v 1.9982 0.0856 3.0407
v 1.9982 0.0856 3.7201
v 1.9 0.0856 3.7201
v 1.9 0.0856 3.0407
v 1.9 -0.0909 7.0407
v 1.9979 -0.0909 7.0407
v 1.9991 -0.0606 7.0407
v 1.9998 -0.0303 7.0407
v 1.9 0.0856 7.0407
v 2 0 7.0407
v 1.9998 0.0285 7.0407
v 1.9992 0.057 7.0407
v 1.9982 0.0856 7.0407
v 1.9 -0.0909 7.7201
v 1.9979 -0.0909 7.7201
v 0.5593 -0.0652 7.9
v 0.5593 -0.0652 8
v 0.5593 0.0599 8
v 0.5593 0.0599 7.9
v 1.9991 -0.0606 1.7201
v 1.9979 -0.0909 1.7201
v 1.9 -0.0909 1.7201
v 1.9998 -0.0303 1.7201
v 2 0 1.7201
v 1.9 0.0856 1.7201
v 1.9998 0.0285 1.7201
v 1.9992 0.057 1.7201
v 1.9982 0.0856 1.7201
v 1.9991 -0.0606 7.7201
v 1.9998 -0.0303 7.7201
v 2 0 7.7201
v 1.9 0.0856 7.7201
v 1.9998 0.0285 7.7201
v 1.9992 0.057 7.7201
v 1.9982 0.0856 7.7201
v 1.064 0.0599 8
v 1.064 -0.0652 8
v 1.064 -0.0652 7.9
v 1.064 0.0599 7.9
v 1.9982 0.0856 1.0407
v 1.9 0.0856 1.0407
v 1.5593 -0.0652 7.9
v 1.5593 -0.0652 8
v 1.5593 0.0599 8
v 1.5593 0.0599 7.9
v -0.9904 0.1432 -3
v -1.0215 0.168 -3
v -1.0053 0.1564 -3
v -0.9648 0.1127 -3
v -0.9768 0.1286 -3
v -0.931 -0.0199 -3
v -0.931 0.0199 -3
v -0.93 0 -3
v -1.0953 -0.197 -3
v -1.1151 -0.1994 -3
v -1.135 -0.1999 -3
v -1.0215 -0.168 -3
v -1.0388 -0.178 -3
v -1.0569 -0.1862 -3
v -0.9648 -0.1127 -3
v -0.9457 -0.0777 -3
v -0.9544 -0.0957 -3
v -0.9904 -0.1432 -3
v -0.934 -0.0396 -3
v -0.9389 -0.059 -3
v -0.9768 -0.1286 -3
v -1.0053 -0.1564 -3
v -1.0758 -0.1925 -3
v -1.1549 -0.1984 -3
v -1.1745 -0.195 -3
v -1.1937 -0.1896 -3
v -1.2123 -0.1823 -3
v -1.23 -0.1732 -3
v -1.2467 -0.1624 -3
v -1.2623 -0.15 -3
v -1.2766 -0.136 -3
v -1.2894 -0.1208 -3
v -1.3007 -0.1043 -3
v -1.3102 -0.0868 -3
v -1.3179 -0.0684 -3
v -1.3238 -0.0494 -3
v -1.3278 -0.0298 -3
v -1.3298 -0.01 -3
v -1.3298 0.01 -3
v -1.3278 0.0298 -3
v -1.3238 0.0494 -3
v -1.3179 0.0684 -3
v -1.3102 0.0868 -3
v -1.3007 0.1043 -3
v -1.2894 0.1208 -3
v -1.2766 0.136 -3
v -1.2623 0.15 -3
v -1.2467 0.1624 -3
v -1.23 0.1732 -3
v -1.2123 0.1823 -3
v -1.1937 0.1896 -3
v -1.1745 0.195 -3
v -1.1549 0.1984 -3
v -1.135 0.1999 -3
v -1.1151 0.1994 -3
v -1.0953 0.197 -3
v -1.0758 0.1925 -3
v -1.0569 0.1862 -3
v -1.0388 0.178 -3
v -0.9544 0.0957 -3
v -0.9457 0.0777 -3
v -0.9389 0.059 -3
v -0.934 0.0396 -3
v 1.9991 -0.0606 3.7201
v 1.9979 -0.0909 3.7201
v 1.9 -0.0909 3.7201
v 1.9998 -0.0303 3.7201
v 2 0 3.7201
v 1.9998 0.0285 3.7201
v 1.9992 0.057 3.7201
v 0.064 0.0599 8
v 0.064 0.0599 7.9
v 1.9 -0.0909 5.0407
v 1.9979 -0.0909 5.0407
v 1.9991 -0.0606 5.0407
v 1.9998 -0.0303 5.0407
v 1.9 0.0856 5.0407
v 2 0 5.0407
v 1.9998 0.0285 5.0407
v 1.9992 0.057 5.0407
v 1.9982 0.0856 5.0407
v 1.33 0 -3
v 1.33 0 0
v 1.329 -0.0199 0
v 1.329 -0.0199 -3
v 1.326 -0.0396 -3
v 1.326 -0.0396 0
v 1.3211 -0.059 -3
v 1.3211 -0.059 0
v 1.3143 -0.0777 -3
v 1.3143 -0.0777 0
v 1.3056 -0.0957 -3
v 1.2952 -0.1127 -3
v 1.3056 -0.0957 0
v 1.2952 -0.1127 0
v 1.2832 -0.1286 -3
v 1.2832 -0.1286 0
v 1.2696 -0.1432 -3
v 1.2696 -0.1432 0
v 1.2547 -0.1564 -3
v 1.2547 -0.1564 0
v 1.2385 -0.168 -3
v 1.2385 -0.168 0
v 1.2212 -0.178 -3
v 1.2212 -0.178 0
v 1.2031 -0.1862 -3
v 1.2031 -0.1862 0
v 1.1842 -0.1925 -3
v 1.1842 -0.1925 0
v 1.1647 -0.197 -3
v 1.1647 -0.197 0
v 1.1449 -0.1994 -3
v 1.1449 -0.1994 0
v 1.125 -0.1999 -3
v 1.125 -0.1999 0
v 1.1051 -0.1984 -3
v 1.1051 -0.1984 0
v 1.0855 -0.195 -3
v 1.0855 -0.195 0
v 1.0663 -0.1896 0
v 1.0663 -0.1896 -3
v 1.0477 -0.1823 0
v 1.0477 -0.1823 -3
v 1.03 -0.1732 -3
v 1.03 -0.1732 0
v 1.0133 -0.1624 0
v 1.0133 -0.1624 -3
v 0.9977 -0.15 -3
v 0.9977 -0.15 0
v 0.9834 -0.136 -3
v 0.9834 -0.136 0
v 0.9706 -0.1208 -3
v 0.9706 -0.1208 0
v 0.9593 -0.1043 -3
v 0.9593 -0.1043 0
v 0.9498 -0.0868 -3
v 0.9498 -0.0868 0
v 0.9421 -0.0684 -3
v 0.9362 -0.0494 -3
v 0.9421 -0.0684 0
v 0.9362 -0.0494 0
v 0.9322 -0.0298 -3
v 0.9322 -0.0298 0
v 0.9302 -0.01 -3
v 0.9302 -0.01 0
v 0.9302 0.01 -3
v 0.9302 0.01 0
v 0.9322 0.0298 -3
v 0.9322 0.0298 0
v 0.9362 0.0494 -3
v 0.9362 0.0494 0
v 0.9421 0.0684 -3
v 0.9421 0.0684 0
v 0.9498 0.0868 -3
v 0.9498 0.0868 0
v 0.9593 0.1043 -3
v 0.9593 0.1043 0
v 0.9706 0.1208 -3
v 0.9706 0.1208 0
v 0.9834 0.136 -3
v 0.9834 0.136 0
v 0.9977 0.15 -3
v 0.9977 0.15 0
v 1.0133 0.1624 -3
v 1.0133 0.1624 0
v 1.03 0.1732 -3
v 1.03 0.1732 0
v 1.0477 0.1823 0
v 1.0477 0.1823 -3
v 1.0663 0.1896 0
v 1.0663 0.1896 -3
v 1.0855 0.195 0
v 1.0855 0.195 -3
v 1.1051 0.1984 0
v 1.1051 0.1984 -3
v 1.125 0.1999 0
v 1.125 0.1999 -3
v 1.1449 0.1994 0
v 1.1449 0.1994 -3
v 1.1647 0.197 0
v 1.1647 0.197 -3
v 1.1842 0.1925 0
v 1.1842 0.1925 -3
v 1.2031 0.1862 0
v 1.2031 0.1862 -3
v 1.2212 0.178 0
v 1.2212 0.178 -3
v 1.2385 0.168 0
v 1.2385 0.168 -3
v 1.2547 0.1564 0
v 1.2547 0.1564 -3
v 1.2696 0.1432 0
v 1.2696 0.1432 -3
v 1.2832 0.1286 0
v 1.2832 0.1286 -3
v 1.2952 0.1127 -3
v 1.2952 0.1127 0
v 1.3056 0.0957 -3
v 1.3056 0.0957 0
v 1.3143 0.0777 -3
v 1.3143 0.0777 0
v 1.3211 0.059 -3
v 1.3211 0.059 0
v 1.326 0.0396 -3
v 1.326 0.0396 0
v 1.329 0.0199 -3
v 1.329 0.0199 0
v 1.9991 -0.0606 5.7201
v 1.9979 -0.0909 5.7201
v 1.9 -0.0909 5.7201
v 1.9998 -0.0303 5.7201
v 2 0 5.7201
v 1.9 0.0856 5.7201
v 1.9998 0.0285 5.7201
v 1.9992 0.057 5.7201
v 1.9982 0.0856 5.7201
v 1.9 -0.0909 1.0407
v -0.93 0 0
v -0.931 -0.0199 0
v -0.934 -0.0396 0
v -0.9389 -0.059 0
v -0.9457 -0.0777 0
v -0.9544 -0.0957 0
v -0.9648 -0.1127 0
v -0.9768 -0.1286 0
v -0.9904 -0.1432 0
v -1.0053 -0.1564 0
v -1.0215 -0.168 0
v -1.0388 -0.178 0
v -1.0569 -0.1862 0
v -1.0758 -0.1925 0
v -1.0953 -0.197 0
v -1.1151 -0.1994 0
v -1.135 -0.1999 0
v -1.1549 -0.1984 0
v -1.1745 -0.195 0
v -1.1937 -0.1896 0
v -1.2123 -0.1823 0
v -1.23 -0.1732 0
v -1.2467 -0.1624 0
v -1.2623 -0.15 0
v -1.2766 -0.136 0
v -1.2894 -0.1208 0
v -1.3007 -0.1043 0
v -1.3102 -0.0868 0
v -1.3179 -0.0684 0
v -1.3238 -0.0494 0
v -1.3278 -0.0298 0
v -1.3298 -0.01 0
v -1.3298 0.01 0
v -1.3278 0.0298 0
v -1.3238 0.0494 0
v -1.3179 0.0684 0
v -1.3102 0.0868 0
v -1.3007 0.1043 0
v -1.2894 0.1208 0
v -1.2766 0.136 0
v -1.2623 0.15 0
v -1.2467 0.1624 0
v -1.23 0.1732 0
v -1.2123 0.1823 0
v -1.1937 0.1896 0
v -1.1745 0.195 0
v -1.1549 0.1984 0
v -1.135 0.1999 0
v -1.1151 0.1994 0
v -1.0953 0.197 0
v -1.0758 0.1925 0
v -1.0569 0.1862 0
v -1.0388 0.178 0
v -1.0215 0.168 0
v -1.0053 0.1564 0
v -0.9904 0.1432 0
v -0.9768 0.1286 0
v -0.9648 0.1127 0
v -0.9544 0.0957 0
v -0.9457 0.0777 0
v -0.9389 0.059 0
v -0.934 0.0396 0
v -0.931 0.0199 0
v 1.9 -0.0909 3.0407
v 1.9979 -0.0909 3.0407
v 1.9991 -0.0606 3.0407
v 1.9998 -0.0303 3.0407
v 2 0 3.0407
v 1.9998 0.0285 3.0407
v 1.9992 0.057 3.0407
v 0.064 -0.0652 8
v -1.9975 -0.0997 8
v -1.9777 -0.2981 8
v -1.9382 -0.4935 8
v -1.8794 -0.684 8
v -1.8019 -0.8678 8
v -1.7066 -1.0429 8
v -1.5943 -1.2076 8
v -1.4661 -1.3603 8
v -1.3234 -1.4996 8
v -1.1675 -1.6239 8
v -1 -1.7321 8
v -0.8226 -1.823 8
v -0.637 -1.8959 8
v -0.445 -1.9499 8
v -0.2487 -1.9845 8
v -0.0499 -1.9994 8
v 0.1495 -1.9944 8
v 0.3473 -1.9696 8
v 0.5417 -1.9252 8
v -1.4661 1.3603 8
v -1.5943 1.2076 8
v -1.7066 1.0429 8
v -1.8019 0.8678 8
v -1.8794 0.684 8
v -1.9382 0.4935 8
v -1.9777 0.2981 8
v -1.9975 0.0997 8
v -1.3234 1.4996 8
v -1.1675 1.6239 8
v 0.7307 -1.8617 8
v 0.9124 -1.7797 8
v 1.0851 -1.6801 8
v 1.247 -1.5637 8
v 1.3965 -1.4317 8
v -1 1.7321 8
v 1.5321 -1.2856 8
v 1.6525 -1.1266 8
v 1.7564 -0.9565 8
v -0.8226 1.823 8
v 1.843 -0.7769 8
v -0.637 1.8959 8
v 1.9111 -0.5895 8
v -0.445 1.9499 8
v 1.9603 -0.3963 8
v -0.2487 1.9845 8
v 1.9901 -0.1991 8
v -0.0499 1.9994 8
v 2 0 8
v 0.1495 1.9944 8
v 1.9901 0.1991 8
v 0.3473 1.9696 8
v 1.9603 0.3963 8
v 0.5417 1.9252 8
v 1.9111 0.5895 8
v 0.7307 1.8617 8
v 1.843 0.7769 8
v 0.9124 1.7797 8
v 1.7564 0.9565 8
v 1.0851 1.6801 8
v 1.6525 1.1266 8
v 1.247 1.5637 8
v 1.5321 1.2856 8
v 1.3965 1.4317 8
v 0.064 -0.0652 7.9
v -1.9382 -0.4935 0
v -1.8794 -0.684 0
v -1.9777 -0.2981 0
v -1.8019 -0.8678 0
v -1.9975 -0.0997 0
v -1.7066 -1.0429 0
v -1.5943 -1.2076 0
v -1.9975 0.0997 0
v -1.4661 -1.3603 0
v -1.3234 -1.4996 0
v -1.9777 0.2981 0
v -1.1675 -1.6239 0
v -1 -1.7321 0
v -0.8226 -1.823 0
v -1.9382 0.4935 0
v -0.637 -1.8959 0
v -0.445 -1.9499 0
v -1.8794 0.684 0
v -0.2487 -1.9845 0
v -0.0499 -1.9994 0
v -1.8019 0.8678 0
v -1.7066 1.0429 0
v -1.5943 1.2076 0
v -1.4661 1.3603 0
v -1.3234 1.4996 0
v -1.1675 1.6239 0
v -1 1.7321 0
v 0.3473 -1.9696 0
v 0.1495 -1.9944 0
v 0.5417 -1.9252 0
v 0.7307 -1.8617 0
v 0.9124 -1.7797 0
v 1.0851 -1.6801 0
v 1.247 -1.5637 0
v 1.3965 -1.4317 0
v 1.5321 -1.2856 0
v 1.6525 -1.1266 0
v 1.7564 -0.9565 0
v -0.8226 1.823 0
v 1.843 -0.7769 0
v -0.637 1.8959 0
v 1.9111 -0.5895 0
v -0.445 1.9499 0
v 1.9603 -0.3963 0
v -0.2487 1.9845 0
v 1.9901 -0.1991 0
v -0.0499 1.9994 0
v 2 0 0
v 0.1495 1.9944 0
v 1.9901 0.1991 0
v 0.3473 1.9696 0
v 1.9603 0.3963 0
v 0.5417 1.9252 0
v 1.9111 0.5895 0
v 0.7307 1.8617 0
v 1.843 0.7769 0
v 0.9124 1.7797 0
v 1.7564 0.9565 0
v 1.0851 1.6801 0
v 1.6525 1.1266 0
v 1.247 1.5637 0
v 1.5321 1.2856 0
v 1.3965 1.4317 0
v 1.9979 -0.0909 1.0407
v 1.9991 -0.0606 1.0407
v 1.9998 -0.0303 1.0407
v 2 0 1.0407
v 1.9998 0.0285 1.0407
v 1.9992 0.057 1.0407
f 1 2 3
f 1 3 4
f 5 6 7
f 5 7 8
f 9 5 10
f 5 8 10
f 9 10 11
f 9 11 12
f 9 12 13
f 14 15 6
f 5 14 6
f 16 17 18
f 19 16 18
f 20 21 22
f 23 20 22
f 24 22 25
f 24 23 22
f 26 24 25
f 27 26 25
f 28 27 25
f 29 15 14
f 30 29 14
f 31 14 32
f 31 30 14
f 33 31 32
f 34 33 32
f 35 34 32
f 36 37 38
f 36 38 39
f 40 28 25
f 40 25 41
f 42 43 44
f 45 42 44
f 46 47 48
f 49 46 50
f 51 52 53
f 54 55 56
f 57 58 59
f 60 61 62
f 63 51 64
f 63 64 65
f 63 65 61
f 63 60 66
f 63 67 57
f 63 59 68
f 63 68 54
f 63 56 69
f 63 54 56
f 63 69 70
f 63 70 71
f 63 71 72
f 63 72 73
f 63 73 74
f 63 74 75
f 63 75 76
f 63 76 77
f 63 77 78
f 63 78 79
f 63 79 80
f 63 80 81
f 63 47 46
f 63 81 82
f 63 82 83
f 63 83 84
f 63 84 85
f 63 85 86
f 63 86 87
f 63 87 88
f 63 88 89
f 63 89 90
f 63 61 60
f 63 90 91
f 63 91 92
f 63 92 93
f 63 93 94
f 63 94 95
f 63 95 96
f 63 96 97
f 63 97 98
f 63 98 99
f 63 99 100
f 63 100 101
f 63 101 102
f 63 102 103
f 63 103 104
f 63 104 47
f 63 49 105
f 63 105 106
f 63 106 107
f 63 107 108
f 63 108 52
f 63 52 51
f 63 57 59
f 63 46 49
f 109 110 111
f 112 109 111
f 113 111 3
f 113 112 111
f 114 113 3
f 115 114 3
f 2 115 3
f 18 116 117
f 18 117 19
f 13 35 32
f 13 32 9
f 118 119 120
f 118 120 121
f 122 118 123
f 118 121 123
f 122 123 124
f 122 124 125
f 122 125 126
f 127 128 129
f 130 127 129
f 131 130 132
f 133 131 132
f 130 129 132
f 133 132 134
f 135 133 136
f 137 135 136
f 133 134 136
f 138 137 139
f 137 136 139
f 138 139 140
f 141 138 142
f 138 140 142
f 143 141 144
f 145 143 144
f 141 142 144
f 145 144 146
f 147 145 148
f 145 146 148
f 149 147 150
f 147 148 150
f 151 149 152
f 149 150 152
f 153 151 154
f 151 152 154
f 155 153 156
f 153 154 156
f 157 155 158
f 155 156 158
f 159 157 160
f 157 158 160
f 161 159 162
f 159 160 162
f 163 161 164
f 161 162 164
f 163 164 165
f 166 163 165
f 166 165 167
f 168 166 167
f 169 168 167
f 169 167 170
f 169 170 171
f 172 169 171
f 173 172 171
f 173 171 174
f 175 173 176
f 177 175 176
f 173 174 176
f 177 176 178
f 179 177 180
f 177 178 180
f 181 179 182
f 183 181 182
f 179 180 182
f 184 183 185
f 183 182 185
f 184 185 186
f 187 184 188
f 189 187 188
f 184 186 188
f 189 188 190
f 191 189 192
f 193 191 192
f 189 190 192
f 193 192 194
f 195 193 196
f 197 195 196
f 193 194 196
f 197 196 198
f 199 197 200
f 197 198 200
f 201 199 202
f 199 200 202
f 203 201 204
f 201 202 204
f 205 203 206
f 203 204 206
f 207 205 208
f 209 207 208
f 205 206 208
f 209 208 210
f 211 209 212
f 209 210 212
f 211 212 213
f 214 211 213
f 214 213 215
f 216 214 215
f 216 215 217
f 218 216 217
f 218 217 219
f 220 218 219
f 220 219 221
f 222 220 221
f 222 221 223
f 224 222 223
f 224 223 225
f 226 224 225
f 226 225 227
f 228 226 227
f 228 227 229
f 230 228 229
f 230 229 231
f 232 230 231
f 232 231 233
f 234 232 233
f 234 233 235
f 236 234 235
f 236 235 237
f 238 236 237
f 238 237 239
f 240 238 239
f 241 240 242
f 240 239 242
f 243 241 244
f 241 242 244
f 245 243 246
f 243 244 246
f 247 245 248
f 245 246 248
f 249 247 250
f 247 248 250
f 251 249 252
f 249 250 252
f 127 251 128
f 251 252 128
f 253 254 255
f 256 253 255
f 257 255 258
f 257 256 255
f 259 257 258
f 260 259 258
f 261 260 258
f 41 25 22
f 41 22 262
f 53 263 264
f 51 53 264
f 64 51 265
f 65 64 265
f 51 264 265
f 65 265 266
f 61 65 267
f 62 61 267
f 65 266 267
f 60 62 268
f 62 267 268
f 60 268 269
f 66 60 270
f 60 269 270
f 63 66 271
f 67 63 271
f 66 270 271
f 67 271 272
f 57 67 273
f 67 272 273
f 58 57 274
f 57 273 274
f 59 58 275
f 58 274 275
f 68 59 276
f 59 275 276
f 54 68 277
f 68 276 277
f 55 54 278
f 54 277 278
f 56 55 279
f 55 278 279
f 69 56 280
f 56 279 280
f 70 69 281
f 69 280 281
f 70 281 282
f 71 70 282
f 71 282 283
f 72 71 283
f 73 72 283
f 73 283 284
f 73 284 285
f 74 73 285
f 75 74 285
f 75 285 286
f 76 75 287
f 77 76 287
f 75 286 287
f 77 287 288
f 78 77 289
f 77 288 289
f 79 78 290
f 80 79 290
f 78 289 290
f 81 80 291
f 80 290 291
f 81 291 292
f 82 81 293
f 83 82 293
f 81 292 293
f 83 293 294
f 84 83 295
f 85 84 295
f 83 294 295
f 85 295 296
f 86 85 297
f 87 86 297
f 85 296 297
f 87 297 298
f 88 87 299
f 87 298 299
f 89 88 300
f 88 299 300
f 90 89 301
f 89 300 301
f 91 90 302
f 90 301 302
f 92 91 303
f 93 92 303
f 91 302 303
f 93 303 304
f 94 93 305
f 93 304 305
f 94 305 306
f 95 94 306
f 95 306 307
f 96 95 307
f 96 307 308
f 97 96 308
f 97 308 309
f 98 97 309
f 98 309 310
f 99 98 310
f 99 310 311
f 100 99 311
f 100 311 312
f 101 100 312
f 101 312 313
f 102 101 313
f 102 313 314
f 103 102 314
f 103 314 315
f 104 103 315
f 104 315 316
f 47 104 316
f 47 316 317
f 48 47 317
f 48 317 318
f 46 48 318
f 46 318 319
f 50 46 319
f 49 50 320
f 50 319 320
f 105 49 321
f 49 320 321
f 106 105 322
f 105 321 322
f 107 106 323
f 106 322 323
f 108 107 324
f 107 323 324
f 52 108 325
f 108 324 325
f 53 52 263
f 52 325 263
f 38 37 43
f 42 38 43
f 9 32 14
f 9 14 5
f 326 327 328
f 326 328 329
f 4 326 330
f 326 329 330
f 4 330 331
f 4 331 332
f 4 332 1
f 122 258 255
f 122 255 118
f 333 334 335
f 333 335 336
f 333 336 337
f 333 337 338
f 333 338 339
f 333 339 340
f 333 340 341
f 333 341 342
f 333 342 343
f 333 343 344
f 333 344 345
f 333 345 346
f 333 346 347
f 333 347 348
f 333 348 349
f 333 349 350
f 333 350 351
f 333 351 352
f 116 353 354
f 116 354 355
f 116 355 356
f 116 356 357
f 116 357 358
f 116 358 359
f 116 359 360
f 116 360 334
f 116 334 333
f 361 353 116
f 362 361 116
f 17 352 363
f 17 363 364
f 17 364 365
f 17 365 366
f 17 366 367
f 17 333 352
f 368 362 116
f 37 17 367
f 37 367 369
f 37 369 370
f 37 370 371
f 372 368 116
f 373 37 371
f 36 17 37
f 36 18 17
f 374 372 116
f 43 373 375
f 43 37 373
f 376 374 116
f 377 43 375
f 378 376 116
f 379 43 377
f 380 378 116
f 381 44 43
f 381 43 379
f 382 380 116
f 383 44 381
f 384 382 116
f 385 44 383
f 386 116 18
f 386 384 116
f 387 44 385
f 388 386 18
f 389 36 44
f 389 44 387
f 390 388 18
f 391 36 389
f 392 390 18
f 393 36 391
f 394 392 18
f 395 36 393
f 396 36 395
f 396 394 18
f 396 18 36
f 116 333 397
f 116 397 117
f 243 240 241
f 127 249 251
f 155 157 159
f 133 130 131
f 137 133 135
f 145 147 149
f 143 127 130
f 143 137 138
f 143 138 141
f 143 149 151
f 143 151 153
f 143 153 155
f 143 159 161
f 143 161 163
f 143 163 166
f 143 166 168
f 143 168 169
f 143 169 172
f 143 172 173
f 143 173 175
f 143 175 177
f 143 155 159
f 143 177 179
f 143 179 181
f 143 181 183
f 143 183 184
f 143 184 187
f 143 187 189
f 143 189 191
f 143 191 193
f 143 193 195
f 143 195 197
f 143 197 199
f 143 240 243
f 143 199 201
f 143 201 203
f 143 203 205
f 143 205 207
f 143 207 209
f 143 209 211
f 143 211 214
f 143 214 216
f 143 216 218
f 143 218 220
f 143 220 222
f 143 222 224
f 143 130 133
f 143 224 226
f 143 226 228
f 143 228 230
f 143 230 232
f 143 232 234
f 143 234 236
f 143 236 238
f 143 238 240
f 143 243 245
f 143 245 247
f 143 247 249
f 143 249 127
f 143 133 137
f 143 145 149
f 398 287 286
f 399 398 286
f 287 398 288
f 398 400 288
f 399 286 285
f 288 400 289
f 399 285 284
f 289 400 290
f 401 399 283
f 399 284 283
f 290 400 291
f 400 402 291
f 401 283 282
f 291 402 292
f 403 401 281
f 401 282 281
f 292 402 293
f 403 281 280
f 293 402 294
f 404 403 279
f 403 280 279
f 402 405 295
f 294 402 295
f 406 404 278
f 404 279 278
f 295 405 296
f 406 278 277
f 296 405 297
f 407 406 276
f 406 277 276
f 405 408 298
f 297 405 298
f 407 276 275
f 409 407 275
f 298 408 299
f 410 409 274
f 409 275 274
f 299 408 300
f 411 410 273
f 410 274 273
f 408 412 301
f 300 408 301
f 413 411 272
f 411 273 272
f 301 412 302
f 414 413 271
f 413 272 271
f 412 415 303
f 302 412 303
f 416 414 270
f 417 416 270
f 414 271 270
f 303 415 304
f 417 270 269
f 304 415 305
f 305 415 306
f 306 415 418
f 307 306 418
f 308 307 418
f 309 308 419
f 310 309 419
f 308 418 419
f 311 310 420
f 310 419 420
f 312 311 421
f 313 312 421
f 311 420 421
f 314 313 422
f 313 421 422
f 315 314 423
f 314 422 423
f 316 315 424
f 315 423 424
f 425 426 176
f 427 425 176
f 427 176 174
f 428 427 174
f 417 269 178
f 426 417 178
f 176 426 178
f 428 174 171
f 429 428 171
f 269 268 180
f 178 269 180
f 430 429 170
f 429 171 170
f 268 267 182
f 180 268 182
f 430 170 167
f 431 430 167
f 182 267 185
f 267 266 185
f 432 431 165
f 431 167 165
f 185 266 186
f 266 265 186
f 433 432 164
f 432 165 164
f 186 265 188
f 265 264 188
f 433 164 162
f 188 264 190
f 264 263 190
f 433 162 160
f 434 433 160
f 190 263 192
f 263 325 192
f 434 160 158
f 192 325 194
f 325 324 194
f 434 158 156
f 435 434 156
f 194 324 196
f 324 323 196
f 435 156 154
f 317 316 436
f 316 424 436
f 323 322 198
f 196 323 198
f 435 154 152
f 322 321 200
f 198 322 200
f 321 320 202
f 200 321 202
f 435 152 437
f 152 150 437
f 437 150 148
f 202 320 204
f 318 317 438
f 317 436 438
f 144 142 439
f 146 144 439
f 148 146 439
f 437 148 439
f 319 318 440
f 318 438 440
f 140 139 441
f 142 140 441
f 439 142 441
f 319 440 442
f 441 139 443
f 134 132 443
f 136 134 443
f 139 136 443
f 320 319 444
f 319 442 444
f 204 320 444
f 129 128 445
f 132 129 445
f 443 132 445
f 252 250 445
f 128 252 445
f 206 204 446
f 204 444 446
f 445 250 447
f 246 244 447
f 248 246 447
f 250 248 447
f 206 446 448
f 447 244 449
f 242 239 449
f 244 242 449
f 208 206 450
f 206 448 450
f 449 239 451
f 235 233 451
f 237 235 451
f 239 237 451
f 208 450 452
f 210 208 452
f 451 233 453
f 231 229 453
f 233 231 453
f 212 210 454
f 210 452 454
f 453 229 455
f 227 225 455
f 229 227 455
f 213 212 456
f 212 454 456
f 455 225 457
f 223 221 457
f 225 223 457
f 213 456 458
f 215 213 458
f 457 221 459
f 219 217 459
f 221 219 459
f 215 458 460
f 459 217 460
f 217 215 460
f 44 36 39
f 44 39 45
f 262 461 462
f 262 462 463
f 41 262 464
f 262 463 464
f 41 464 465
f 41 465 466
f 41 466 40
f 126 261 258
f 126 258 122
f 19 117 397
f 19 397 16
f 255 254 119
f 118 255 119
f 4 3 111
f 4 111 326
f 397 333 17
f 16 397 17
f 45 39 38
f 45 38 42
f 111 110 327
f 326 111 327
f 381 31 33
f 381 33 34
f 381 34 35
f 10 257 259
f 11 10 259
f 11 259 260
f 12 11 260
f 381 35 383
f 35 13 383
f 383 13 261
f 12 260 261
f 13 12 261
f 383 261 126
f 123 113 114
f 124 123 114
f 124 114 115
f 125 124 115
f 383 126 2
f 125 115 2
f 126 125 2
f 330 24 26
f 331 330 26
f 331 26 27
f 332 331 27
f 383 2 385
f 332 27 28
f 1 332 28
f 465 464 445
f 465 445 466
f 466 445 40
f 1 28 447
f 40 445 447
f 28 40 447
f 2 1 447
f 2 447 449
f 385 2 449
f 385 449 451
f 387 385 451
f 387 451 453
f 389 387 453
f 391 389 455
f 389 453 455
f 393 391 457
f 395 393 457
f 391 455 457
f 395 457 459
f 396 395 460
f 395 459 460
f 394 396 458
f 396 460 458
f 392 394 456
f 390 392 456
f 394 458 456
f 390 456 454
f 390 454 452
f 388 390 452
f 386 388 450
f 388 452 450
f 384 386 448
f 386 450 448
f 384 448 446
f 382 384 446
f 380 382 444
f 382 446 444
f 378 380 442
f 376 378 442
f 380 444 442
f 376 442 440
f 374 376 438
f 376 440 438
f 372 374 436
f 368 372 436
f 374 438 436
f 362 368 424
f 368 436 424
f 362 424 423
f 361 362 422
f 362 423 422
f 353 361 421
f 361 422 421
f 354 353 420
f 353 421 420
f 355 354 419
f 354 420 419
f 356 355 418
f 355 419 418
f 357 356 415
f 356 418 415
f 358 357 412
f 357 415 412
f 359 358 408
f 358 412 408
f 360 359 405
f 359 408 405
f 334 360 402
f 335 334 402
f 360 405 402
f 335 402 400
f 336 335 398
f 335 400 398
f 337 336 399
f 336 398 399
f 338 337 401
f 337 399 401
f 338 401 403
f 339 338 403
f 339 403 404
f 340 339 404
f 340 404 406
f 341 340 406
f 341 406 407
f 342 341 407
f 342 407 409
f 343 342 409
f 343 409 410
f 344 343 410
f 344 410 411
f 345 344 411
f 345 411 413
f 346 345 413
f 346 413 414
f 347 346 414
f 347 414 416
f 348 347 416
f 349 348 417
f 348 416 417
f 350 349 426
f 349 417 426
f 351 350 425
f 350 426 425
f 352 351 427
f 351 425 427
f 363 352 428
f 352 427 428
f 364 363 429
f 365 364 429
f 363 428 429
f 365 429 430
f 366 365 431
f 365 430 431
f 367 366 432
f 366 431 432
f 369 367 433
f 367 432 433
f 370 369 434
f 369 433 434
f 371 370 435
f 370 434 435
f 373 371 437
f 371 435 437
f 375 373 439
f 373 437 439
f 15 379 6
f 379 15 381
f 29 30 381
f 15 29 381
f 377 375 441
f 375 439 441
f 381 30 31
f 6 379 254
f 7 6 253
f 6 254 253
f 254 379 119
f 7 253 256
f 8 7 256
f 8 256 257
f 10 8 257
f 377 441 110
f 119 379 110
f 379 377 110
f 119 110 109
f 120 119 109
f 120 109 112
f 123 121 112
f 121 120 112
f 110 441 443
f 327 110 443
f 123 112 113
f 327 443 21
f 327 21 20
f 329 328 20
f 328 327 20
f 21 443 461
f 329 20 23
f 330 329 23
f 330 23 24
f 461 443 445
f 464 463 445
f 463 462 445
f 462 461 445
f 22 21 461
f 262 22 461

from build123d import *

# Parameters (mm, degrees)
SKETCH_1_R          = 2
EXTRUDE_1_DEPTH     = 8
SKETCH_2_R          = 0.2
EXTRUDE_2_DEPTH     = 3
SKETCH_3_W          = 0.679467602
SKETCH_3_H          = 0.176485091
CUT_EXTRUDE_1_DEPTH = 0.1
SKETCH_6_W          = 0.495308974
SKETCH_6_H          = 0.125078023
CUT_EXTRUDE_2_DEPTH = 0.1


with BuildPart() as part:
    # 草图1 → 凸台-拉伸1 (new body)
    with BuildSketch(Plane.XY):
        Circle(SKETCH_1_R)
    extrude(amount=EXTRUDE_1_DEPTH)

    # 草图2 → 凸台-拉伸2 (add)
    with BuildSketch(Plane(origin=(0, 0, 0), x_dir=(-1, 0, 0), z_dir=(0, 0, -1))):
        with Locations(Location((-1.13, 0, 0), (0, 0, 180))):
            Circle(SKETCH_2_R)
        with Locations(Location((1.13, 0, 0), (0, 0, 180))):
            Circle(SKETCH_2_R)
    extrude(amount=EXTRUDE_2_DEPTH)

    # 草图3 → 切除-拉伸1 (cut)
    with BuildSketch(Plane(origin=(2, 0, 0), x_dir=(0, 0, -1), z_dir=(1, 0, 0))):
        with Locations((-5.380383813, -0.002684697)):
            Rectangle(SKETCH_3_W, SKETCH_3_H)
        with Locations((-7.380383813, -0.002684697)):
            Rectangle(SKETCH_3_W, SKETCH_3_H)
        with Locations((-3.380383813, -0.002684697)):
            Rectangle(SKETCH_3_W, SKETCH_3_H)
        with Locations((-1.380383813, -0.002684697)):
            Rectangle(SKETCH_3_W, SKETCH_3_H)
    extrude(amount=-CUT_EXTRUDE_1_DEPTH, mode=Mode.SUBTRACT)

    # 草图6 → 切除-拉伸2 (cut)
    with BuildSketch(Plane.XY.offset(8)):
        with Locations((1.311678539, -0.002672358)):
            Rectangle(SKETCH_6_W, SKETCH_6_H)
        with Locations((0.311678539, -0.002672358)):
            Rectangle(SKETCH_6_W, SKETCH_6_H)
    extrude(amount=-CUT_EXTRUDE_2_DEPTH, mode=Mode.SUBTRACT)


solid = part.part
